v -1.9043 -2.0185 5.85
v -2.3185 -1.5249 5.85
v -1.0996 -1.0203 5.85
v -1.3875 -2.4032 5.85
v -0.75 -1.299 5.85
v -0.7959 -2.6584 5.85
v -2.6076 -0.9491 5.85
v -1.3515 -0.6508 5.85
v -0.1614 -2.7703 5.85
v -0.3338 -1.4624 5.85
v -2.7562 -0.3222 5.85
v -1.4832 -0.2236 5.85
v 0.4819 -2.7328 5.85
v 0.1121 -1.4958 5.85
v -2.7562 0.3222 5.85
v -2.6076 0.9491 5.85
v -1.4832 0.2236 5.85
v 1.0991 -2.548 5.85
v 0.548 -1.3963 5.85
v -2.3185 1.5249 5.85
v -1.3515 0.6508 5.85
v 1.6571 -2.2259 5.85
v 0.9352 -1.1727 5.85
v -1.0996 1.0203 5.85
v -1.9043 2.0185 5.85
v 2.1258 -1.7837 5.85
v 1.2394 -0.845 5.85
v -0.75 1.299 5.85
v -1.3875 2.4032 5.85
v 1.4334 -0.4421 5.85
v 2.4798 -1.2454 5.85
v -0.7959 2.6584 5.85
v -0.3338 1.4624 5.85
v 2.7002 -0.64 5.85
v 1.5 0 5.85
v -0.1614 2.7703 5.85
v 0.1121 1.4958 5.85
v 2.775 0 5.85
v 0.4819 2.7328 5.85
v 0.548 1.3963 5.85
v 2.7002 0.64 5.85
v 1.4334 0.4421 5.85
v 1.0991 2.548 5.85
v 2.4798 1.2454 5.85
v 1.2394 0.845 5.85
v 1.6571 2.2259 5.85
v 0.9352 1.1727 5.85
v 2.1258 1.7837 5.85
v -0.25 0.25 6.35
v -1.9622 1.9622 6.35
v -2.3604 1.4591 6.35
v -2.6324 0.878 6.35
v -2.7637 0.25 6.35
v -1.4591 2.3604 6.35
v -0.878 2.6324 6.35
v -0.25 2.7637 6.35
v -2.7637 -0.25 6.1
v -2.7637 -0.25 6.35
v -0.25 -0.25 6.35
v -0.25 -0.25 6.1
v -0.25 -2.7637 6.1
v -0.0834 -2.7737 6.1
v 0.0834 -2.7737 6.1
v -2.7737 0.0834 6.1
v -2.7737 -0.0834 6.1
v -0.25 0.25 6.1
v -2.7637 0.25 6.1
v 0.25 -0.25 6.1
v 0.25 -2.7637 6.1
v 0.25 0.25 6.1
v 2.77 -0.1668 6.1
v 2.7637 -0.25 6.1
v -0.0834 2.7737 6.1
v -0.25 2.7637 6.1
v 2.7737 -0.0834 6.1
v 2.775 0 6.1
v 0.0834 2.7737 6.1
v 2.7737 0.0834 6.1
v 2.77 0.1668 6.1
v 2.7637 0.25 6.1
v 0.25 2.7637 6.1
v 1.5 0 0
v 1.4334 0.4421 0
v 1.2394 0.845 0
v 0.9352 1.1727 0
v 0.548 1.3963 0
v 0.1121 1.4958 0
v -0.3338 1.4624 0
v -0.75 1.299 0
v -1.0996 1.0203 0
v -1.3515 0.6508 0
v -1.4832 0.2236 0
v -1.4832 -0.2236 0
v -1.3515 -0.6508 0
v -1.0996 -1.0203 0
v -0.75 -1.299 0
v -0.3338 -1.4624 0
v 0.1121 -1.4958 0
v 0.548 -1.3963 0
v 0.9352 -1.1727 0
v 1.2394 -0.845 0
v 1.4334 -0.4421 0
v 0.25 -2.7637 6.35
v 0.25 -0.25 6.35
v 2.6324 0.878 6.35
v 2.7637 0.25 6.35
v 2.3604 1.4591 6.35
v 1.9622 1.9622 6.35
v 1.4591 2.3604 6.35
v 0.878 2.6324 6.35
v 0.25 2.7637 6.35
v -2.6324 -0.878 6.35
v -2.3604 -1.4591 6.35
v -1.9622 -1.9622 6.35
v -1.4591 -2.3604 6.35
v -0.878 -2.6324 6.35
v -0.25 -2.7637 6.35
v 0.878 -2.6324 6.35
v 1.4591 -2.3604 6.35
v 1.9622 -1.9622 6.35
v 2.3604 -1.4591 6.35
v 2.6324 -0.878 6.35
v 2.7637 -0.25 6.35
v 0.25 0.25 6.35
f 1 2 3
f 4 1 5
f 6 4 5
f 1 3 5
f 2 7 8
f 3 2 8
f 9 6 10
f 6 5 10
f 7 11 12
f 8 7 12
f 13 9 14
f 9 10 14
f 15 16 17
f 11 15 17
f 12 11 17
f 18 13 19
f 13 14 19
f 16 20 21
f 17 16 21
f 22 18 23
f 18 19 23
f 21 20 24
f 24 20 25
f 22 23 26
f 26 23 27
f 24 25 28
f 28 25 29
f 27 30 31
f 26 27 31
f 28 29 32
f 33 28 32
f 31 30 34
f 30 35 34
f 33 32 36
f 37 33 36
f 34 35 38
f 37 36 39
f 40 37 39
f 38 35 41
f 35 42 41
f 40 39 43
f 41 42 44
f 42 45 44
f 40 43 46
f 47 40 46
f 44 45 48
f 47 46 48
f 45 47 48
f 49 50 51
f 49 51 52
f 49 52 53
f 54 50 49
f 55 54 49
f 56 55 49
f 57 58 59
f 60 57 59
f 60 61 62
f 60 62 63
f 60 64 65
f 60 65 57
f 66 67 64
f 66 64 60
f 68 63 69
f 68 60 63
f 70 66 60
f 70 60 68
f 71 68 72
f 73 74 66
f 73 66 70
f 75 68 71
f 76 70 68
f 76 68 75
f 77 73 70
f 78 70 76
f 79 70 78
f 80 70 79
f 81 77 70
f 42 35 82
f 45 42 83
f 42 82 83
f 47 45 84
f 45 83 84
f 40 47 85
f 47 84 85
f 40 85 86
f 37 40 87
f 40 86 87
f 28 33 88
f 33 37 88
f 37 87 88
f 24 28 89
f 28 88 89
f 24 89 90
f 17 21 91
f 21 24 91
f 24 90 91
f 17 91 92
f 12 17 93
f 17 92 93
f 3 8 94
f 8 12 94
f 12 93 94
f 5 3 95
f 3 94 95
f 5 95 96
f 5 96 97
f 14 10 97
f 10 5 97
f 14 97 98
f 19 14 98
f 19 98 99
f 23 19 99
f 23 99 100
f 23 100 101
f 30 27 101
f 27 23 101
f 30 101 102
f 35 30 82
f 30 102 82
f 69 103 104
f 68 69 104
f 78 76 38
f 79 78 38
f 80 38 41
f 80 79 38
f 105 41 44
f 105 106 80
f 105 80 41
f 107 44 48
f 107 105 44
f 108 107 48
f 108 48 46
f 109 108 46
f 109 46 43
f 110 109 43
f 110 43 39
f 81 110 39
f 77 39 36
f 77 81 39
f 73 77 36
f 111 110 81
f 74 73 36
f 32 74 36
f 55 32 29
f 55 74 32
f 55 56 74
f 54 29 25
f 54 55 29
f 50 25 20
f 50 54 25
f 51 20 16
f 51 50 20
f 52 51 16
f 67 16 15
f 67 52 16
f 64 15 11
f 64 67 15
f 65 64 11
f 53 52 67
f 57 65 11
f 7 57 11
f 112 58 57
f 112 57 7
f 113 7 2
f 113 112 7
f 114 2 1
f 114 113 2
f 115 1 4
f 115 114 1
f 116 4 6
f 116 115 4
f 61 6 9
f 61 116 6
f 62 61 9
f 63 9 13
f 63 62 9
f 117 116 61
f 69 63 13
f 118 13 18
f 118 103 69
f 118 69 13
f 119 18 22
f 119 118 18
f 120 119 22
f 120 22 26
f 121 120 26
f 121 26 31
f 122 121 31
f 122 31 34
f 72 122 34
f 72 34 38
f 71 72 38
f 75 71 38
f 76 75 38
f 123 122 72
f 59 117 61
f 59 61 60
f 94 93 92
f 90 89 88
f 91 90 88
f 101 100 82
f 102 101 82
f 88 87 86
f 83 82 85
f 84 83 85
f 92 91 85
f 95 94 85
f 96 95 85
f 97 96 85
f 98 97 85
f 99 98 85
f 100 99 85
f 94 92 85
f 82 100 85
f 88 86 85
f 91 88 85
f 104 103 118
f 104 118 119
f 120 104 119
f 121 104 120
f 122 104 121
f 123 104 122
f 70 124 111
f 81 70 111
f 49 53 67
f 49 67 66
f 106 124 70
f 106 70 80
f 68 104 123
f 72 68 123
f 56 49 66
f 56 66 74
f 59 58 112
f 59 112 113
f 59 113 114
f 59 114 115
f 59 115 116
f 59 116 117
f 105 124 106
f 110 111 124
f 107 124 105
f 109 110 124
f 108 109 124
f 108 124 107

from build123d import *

# Parameters (mm, degrees)
SKETCH1_R               = 1.5
BOSS_EXTRUDE1_DEPTH     = 6.35
SKETCH3_R               = 2.775
BOSS_EXTRUDE3_DEPTH     = 0.5
SKETCH4_W               = 0.5
SKETCH4_H               = 6.00854879
SKETCH4_W_2             = 6.00854879
SKETCH4_H_2             = 0.5
CUT_EXTRUDE_THIN1_DEPTH = 0.25


with BuildPart() as part:
    # Sketch1 → Boss-Extrude1 (new body)
    with BuildSketch(Plane.XY):
        Circle(SKETCH1_R)
    extrude(amount=BOSS_EXTRUDE1_DEPTH)

    # Sketch3 → Boss-Extrude3 (add)
    with BuildSketch(Plane.XY.offset(6.35)):
        Circle(SKETCH3_R)
    extrude(amount=-BOSS_EXTRUDE3_DEPTH)

    # Sketch4 → Cut-Extrude-Thin1 (cut)
    with BuildSketch(Plane.XY.offset(6.35)):
        Rectangle(SKETCH4_W, SKETCH4_H)
        Rectangle(SKETCH4_W_2, SKETCH4_H_2)
    extrude(amount=-CUT_EXTRUDE_THIN1_DEPTH, mode=Mode.SUBTRACT)


solid = part.part
